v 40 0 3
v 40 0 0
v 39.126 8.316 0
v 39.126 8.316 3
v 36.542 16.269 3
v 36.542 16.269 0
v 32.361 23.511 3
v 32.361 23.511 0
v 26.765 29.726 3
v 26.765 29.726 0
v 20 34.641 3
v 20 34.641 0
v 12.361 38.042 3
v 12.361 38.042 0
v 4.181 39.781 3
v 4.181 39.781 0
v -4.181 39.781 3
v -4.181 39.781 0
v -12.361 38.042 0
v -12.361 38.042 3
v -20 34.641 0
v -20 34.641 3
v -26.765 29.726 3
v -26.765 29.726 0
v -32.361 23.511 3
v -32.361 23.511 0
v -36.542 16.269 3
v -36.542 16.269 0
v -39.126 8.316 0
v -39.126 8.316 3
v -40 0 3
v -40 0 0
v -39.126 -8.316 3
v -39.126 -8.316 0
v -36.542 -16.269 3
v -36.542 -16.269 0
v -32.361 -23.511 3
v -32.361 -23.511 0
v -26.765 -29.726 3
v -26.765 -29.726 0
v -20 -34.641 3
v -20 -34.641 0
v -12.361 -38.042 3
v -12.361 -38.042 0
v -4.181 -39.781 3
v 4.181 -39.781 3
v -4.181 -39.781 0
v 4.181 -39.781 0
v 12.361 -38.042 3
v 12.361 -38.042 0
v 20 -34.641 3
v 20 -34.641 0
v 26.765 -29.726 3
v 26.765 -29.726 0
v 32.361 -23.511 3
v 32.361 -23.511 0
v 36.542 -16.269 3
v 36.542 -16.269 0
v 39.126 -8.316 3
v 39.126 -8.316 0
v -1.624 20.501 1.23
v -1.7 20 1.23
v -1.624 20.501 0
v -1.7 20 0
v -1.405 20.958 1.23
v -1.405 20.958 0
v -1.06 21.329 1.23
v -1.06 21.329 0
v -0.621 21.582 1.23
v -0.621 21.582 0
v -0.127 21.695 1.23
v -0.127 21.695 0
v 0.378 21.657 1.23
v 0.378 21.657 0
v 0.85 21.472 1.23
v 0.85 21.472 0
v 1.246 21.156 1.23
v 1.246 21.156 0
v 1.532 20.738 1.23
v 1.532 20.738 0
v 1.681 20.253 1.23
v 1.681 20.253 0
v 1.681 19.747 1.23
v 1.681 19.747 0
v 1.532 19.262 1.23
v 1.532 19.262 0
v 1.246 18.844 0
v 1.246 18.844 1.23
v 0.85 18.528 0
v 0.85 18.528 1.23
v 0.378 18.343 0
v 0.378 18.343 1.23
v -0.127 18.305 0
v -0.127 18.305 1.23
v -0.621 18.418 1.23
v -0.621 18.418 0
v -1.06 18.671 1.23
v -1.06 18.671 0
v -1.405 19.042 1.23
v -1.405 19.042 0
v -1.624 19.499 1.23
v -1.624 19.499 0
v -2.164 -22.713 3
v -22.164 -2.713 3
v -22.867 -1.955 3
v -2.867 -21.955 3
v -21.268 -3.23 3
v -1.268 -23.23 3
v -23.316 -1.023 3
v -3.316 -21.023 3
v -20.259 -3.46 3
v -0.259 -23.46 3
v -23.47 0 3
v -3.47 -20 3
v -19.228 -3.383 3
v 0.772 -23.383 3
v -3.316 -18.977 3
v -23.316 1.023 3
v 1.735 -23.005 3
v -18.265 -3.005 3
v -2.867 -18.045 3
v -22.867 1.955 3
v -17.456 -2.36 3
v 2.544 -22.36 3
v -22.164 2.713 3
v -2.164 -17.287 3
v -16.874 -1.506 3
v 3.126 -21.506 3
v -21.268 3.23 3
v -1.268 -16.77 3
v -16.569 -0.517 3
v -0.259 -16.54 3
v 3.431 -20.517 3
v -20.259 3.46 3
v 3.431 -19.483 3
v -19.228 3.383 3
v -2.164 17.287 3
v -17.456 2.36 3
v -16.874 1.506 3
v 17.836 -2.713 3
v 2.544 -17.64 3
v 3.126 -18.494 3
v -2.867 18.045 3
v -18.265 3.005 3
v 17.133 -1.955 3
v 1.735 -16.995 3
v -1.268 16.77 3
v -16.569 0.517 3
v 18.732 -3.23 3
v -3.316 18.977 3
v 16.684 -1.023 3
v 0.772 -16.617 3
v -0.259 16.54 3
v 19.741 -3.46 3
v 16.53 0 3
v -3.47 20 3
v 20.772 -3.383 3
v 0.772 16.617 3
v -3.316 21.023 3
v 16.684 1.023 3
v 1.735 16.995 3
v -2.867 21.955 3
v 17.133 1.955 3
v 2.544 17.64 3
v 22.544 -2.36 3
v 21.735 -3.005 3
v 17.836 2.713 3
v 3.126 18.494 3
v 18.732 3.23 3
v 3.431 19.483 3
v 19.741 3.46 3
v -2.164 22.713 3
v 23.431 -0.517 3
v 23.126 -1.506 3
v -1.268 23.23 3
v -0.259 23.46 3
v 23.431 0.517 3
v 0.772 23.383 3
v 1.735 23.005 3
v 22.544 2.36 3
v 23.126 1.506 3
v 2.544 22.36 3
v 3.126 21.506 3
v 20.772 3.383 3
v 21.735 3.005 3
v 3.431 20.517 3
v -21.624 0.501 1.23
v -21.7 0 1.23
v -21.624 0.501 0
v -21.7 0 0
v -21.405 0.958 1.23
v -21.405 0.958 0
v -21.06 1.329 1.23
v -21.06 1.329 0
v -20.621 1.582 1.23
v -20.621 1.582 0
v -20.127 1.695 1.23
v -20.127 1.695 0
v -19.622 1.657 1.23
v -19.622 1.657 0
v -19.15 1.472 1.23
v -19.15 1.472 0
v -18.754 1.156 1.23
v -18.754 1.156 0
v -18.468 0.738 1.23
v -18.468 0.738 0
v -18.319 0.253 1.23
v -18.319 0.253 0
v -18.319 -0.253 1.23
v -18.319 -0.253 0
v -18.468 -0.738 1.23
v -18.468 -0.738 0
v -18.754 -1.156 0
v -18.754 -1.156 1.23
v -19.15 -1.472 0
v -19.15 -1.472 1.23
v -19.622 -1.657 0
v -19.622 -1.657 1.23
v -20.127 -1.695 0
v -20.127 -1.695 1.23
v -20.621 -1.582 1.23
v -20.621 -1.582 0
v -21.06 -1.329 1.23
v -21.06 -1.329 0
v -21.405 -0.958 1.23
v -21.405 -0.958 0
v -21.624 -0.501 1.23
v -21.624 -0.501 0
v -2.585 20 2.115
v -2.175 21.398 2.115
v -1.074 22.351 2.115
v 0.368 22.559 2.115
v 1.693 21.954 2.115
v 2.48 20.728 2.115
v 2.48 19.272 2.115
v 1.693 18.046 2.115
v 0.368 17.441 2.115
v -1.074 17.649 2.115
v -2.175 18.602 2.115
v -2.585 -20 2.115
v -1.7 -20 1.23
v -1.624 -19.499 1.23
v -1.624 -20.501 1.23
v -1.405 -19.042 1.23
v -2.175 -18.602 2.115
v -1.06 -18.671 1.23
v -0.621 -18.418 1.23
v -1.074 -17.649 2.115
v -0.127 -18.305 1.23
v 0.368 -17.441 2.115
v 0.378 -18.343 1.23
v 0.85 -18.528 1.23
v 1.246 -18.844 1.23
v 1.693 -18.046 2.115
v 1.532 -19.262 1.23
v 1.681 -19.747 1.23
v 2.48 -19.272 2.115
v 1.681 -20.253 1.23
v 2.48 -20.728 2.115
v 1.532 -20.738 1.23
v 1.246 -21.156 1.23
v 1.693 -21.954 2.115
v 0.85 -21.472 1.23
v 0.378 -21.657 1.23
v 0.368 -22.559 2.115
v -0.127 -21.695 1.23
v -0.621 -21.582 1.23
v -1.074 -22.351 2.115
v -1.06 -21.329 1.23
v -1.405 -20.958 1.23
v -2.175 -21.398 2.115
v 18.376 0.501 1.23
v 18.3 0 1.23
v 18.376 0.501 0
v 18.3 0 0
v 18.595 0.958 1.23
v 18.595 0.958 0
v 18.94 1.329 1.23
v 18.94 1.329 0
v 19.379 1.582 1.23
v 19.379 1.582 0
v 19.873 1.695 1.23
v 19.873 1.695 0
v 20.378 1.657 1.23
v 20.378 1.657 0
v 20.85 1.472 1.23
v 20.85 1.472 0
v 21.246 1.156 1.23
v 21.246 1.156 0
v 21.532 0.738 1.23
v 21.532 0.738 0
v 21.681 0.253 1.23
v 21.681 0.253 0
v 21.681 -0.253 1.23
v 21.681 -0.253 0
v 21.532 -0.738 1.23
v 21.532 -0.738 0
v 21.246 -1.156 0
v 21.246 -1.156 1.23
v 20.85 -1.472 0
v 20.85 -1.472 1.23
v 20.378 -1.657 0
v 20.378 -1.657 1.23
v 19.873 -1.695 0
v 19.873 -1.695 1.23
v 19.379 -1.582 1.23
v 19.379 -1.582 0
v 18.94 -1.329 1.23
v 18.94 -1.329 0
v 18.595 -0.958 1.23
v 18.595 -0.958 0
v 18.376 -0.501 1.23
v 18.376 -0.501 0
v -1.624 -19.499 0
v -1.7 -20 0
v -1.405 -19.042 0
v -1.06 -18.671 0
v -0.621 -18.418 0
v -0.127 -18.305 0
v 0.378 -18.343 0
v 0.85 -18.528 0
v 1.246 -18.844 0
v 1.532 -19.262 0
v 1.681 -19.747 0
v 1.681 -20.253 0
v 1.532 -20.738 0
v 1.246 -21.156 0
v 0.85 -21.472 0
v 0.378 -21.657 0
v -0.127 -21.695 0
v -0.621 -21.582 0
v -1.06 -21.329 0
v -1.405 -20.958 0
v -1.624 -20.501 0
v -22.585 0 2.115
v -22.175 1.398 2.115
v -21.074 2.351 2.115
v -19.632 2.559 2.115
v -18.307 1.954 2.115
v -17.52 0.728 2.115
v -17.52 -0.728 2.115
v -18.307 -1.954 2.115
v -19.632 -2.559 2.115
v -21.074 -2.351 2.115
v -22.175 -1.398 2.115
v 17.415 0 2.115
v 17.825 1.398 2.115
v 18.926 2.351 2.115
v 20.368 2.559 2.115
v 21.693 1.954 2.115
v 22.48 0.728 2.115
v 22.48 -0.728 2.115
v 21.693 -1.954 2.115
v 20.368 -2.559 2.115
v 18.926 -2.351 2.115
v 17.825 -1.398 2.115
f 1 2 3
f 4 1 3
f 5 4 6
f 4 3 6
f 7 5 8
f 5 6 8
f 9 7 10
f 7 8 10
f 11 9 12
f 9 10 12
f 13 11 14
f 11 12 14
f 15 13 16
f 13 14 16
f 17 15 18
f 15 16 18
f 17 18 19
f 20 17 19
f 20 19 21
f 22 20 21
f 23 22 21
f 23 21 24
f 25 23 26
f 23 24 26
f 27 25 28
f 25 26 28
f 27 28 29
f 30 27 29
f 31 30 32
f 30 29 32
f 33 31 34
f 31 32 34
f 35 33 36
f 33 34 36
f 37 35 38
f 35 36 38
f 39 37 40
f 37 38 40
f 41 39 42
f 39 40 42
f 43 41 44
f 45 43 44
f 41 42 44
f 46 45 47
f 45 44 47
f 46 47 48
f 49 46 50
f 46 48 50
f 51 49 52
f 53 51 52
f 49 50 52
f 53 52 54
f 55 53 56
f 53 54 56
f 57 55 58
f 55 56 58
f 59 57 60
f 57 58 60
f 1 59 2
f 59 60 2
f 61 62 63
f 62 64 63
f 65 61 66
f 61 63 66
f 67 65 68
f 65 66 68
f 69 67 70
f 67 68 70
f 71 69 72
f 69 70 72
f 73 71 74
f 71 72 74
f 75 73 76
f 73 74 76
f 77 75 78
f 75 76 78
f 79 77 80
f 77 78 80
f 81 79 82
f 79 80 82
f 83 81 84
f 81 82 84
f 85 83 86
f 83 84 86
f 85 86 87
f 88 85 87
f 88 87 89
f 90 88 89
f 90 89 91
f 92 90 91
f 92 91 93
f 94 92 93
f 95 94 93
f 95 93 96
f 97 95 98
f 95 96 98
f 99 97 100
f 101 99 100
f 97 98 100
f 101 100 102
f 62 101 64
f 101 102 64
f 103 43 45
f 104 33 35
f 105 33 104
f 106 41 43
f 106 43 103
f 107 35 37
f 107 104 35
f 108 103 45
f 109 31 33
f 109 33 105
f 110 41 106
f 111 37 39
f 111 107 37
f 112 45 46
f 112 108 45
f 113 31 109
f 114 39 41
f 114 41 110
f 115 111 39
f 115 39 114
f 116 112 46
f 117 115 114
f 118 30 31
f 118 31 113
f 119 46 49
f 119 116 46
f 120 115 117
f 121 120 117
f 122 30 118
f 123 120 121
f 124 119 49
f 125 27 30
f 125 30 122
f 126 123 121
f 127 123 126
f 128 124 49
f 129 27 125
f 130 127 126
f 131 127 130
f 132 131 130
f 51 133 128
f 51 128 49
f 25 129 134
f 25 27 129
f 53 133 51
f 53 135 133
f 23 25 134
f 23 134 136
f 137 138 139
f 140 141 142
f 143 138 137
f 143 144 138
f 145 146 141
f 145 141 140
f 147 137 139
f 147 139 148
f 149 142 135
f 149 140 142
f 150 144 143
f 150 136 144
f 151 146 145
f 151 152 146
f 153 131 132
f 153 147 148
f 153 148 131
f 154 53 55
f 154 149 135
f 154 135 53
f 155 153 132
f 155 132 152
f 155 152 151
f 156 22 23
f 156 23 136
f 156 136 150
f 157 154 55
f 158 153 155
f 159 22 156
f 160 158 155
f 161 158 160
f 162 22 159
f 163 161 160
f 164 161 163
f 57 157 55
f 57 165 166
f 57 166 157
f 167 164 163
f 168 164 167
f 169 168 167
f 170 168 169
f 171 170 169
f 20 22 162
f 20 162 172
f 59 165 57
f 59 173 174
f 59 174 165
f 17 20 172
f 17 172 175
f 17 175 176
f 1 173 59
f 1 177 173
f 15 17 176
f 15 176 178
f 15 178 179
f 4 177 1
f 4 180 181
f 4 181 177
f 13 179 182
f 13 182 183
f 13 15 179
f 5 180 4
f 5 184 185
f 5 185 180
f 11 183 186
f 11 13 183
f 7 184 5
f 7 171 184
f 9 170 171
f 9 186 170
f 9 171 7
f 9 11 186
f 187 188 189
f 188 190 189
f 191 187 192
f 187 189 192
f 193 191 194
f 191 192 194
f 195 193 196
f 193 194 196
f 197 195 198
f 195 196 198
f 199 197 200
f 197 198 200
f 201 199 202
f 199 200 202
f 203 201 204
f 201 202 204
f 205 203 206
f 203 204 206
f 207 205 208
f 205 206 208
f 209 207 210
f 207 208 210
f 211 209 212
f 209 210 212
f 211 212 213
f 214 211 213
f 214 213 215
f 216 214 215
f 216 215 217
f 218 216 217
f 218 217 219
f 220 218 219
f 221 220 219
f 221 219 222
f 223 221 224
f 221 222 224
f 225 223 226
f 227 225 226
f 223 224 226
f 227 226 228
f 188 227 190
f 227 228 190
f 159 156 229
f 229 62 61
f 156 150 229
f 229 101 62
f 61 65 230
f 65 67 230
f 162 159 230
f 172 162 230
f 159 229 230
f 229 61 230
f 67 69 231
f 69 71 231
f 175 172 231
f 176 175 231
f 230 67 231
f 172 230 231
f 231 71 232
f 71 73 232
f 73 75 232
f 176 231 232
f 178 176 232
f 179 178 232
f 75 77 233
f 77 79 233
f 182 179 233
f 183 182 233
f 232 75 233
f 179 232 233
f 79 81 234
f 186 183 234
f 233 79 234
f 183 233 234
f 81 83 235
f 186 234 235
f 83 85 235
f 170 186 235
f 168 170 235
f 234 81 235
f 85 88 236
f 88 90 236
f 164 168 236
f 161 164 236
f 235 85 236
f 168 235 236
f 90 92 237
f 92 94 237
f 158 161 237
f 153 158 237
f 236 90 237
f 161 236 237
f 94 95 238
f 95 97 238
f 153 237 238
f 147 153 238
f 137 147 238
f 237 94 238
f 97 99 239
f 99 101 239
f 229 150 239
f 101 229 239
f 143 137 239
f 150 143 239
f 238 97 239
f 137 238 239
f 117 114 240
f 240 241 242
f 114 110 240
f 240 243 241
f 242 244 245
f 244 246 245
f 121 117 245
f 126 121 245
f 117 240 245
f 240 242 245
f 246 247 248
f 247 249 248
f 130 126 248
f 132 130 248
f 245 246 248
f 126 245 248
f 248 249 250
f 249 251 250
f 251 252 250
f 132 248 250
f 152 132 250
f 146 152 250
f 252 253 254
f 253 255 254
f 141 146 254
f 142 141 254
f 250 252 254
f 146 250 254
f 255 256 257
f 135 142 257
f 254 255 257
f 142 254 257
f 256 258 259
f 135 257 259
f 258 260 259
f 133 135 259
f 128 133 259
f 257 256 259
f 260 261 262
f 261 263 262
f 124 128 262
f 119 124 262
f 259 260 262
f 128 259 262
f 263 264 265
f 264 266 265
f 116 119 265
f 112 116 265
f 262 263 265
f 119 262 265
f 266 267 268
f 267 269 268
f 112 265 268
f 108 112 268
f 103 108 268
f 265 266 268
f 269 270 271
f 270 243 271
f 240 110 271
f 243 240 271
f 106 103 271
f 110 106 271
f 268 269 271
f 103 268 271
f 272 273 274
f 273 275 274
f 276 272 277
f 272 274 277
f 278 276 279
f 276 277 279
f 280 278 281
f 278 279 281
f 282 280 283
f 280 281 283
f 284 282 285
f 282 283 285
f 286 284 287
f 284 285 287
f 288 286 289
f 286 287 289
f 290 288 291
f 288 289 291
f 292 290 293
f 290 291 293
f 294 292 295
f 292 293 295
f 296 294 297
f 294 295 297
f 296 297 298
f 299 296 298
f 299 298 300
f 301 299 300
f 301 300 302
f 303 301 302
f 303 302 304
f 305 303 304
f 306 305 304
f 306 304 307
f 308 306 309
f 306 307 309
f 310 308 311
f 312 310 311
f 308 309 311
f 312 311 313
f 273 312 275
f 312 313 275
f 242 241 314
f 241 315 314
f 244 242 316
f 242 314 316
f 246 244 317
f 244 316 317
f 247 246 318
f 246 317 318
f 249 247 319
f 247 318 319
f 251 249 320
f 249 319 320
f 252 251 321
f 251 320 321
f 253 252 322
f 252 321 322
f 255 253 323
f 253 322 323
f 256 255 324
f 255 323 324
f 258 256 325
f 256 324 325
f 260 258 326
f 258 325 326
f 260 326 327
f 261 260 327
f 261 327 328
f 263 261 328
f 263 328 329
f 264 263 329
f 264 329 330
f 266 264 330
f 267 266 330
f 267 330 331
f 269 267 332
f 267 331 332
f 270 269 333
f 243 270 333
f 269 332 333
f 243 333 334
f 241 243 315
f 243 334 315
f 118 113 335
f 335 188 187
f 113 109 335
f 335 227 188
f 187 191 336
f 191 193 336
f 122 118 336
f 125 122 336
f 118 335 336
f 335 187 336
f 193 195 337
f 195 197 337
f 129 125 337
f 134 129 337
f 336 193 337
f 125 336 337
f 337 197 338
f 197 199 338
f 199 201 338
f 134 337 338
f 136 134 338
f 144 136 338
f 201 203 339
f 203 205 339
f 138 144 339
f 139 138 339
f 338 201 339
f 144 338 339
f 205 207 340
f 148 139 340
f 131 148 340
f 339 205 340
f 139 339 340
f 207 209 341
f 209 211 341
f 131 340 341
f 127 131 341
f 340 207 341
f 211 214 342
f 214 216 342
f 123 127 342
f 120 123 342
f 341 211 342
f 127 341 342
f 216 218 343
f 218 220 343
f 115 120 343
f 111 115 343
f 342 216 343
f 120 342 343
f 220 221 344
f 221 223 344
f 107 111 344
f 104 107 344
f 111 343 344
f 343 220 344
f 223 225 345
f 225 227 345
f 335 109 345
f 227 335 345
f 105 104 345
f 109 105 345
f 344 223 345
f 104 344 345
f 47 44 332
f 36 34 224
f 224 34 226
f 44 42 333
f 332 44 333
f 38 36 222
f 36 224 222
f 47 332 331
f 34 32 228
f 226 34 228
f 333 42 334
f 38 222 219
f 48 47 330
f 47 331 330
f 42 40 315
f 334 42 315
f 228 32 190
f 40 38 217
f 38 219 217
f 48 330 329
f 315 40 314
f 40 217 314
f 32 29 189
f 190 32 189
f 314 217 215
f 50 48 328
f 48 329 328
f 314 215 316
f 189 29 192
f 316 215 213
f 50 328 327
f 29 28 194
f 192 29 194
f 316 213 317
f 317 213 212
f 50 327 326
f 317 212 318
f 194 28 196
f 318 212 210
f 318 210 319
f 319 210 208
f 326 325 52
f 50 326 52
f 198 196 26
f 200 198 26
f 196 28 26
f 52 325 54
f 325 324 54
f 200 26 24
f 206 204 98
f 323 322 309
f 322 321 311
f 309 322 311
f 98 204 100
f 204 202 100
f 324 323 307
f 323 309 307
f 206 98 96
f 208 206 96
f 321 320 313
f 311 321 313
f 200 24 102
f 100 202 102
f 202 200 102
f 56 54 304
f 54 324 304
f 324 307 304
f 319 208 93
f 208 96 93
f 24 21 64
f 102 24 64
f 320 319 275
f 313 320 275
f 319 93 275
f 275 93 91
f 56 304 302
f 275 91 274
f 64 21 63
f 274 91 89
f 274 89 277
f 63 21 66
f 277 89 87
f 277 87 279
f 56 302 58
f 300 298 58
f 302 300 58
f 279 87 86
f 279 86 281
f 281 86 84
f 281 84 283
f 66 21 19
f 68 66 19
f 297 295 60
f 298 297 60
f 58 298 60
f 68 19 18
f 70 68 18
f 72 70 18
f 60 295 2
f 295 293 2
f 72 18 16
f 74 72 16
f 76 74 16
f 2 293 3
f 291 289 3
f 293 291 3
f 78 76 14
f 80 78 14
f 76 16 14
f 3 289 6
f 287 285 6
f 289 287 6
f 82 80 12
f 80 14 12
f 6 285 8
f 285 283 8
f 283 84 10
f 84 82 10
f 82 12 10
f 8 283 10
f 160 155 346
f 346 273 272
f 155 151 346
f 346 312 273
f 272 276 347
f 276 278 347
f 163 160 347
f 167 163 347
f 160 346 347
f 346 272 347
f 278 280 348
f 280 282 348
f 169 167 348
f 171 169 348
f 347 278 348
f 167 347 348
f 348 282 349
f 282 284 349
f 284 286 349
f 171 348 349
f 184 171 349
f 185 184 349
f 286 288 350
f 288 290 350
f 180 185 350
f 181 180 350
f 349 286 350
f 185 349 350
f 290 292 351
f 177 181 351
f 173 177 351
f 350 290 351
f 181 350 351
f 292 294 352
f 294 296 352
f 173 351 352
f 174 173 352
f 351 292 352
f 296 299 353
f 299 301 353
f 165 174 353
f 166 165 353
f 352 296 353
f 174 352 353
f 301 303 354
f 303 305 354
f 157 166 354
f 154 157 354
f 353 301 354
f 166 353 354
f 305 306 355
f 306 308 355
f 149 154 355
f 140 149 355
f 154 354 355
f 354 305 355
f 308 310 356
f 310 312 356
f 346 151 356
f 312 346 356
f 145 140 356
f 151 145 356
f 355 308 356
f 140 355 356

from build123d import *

# Parameters (mm, degrees)
SKETCH_1_R                   = 40
EXTRUDE_1_DEPTH              = 3
HOLE_WIZARD_M3_1_D           = 3.4
HOLE_WIZARD_M3_1_DEPTH       = 10.12
HOLE_WIZARD_M3_1_CSINK_D     = 6.94
HOLE_WIZARD_M3_1_CSINK_ANGLE = 90
HOLE_WIZARD_M3_1_TIP         = 1.021463052


with BuildPart() as part:
    # 草图1 → 凸台-拉伸1 (new body)
    with BuildSketch(Plane.XY):
        Circle(SKETCH_1_R)
    extrude(amount=EXTRUDE_1_DEPTH)

    # M3 六角凹锥坑头螺钉的锥形沉头孔1
    with Locations(Plane(origin=(0, 20, 3), x_dir=(1, 0, 0), z_dir=(0, 0, 1))):
        with Locations((0, 0), (20, -20), (0, -40), (-20, -20)):
            CounterSinkHole(HOLE_WIZARD_M3_1_D / 2, HOLE_WIZARD_M3_1_CSINK_D / 2, depth=HOLE_WIZARD_M3_1_DEPTH, counter_sink_angle=HOLE_WIZARD_M3_1_CSINK_ANGLE)
            with Locations((0, 0, -(HOLE_WIZARD_M3_1_DEPTH + HOLE_WIZARD_M3_1_TIP / 2))):  # 118° drill point
                Cone(0, HOLE_WIZARD_M3_1_D / 2, HOLE_WIZARD_M3_1_TIP, mode=Mode.SUBTRACT)


solid = part.part
